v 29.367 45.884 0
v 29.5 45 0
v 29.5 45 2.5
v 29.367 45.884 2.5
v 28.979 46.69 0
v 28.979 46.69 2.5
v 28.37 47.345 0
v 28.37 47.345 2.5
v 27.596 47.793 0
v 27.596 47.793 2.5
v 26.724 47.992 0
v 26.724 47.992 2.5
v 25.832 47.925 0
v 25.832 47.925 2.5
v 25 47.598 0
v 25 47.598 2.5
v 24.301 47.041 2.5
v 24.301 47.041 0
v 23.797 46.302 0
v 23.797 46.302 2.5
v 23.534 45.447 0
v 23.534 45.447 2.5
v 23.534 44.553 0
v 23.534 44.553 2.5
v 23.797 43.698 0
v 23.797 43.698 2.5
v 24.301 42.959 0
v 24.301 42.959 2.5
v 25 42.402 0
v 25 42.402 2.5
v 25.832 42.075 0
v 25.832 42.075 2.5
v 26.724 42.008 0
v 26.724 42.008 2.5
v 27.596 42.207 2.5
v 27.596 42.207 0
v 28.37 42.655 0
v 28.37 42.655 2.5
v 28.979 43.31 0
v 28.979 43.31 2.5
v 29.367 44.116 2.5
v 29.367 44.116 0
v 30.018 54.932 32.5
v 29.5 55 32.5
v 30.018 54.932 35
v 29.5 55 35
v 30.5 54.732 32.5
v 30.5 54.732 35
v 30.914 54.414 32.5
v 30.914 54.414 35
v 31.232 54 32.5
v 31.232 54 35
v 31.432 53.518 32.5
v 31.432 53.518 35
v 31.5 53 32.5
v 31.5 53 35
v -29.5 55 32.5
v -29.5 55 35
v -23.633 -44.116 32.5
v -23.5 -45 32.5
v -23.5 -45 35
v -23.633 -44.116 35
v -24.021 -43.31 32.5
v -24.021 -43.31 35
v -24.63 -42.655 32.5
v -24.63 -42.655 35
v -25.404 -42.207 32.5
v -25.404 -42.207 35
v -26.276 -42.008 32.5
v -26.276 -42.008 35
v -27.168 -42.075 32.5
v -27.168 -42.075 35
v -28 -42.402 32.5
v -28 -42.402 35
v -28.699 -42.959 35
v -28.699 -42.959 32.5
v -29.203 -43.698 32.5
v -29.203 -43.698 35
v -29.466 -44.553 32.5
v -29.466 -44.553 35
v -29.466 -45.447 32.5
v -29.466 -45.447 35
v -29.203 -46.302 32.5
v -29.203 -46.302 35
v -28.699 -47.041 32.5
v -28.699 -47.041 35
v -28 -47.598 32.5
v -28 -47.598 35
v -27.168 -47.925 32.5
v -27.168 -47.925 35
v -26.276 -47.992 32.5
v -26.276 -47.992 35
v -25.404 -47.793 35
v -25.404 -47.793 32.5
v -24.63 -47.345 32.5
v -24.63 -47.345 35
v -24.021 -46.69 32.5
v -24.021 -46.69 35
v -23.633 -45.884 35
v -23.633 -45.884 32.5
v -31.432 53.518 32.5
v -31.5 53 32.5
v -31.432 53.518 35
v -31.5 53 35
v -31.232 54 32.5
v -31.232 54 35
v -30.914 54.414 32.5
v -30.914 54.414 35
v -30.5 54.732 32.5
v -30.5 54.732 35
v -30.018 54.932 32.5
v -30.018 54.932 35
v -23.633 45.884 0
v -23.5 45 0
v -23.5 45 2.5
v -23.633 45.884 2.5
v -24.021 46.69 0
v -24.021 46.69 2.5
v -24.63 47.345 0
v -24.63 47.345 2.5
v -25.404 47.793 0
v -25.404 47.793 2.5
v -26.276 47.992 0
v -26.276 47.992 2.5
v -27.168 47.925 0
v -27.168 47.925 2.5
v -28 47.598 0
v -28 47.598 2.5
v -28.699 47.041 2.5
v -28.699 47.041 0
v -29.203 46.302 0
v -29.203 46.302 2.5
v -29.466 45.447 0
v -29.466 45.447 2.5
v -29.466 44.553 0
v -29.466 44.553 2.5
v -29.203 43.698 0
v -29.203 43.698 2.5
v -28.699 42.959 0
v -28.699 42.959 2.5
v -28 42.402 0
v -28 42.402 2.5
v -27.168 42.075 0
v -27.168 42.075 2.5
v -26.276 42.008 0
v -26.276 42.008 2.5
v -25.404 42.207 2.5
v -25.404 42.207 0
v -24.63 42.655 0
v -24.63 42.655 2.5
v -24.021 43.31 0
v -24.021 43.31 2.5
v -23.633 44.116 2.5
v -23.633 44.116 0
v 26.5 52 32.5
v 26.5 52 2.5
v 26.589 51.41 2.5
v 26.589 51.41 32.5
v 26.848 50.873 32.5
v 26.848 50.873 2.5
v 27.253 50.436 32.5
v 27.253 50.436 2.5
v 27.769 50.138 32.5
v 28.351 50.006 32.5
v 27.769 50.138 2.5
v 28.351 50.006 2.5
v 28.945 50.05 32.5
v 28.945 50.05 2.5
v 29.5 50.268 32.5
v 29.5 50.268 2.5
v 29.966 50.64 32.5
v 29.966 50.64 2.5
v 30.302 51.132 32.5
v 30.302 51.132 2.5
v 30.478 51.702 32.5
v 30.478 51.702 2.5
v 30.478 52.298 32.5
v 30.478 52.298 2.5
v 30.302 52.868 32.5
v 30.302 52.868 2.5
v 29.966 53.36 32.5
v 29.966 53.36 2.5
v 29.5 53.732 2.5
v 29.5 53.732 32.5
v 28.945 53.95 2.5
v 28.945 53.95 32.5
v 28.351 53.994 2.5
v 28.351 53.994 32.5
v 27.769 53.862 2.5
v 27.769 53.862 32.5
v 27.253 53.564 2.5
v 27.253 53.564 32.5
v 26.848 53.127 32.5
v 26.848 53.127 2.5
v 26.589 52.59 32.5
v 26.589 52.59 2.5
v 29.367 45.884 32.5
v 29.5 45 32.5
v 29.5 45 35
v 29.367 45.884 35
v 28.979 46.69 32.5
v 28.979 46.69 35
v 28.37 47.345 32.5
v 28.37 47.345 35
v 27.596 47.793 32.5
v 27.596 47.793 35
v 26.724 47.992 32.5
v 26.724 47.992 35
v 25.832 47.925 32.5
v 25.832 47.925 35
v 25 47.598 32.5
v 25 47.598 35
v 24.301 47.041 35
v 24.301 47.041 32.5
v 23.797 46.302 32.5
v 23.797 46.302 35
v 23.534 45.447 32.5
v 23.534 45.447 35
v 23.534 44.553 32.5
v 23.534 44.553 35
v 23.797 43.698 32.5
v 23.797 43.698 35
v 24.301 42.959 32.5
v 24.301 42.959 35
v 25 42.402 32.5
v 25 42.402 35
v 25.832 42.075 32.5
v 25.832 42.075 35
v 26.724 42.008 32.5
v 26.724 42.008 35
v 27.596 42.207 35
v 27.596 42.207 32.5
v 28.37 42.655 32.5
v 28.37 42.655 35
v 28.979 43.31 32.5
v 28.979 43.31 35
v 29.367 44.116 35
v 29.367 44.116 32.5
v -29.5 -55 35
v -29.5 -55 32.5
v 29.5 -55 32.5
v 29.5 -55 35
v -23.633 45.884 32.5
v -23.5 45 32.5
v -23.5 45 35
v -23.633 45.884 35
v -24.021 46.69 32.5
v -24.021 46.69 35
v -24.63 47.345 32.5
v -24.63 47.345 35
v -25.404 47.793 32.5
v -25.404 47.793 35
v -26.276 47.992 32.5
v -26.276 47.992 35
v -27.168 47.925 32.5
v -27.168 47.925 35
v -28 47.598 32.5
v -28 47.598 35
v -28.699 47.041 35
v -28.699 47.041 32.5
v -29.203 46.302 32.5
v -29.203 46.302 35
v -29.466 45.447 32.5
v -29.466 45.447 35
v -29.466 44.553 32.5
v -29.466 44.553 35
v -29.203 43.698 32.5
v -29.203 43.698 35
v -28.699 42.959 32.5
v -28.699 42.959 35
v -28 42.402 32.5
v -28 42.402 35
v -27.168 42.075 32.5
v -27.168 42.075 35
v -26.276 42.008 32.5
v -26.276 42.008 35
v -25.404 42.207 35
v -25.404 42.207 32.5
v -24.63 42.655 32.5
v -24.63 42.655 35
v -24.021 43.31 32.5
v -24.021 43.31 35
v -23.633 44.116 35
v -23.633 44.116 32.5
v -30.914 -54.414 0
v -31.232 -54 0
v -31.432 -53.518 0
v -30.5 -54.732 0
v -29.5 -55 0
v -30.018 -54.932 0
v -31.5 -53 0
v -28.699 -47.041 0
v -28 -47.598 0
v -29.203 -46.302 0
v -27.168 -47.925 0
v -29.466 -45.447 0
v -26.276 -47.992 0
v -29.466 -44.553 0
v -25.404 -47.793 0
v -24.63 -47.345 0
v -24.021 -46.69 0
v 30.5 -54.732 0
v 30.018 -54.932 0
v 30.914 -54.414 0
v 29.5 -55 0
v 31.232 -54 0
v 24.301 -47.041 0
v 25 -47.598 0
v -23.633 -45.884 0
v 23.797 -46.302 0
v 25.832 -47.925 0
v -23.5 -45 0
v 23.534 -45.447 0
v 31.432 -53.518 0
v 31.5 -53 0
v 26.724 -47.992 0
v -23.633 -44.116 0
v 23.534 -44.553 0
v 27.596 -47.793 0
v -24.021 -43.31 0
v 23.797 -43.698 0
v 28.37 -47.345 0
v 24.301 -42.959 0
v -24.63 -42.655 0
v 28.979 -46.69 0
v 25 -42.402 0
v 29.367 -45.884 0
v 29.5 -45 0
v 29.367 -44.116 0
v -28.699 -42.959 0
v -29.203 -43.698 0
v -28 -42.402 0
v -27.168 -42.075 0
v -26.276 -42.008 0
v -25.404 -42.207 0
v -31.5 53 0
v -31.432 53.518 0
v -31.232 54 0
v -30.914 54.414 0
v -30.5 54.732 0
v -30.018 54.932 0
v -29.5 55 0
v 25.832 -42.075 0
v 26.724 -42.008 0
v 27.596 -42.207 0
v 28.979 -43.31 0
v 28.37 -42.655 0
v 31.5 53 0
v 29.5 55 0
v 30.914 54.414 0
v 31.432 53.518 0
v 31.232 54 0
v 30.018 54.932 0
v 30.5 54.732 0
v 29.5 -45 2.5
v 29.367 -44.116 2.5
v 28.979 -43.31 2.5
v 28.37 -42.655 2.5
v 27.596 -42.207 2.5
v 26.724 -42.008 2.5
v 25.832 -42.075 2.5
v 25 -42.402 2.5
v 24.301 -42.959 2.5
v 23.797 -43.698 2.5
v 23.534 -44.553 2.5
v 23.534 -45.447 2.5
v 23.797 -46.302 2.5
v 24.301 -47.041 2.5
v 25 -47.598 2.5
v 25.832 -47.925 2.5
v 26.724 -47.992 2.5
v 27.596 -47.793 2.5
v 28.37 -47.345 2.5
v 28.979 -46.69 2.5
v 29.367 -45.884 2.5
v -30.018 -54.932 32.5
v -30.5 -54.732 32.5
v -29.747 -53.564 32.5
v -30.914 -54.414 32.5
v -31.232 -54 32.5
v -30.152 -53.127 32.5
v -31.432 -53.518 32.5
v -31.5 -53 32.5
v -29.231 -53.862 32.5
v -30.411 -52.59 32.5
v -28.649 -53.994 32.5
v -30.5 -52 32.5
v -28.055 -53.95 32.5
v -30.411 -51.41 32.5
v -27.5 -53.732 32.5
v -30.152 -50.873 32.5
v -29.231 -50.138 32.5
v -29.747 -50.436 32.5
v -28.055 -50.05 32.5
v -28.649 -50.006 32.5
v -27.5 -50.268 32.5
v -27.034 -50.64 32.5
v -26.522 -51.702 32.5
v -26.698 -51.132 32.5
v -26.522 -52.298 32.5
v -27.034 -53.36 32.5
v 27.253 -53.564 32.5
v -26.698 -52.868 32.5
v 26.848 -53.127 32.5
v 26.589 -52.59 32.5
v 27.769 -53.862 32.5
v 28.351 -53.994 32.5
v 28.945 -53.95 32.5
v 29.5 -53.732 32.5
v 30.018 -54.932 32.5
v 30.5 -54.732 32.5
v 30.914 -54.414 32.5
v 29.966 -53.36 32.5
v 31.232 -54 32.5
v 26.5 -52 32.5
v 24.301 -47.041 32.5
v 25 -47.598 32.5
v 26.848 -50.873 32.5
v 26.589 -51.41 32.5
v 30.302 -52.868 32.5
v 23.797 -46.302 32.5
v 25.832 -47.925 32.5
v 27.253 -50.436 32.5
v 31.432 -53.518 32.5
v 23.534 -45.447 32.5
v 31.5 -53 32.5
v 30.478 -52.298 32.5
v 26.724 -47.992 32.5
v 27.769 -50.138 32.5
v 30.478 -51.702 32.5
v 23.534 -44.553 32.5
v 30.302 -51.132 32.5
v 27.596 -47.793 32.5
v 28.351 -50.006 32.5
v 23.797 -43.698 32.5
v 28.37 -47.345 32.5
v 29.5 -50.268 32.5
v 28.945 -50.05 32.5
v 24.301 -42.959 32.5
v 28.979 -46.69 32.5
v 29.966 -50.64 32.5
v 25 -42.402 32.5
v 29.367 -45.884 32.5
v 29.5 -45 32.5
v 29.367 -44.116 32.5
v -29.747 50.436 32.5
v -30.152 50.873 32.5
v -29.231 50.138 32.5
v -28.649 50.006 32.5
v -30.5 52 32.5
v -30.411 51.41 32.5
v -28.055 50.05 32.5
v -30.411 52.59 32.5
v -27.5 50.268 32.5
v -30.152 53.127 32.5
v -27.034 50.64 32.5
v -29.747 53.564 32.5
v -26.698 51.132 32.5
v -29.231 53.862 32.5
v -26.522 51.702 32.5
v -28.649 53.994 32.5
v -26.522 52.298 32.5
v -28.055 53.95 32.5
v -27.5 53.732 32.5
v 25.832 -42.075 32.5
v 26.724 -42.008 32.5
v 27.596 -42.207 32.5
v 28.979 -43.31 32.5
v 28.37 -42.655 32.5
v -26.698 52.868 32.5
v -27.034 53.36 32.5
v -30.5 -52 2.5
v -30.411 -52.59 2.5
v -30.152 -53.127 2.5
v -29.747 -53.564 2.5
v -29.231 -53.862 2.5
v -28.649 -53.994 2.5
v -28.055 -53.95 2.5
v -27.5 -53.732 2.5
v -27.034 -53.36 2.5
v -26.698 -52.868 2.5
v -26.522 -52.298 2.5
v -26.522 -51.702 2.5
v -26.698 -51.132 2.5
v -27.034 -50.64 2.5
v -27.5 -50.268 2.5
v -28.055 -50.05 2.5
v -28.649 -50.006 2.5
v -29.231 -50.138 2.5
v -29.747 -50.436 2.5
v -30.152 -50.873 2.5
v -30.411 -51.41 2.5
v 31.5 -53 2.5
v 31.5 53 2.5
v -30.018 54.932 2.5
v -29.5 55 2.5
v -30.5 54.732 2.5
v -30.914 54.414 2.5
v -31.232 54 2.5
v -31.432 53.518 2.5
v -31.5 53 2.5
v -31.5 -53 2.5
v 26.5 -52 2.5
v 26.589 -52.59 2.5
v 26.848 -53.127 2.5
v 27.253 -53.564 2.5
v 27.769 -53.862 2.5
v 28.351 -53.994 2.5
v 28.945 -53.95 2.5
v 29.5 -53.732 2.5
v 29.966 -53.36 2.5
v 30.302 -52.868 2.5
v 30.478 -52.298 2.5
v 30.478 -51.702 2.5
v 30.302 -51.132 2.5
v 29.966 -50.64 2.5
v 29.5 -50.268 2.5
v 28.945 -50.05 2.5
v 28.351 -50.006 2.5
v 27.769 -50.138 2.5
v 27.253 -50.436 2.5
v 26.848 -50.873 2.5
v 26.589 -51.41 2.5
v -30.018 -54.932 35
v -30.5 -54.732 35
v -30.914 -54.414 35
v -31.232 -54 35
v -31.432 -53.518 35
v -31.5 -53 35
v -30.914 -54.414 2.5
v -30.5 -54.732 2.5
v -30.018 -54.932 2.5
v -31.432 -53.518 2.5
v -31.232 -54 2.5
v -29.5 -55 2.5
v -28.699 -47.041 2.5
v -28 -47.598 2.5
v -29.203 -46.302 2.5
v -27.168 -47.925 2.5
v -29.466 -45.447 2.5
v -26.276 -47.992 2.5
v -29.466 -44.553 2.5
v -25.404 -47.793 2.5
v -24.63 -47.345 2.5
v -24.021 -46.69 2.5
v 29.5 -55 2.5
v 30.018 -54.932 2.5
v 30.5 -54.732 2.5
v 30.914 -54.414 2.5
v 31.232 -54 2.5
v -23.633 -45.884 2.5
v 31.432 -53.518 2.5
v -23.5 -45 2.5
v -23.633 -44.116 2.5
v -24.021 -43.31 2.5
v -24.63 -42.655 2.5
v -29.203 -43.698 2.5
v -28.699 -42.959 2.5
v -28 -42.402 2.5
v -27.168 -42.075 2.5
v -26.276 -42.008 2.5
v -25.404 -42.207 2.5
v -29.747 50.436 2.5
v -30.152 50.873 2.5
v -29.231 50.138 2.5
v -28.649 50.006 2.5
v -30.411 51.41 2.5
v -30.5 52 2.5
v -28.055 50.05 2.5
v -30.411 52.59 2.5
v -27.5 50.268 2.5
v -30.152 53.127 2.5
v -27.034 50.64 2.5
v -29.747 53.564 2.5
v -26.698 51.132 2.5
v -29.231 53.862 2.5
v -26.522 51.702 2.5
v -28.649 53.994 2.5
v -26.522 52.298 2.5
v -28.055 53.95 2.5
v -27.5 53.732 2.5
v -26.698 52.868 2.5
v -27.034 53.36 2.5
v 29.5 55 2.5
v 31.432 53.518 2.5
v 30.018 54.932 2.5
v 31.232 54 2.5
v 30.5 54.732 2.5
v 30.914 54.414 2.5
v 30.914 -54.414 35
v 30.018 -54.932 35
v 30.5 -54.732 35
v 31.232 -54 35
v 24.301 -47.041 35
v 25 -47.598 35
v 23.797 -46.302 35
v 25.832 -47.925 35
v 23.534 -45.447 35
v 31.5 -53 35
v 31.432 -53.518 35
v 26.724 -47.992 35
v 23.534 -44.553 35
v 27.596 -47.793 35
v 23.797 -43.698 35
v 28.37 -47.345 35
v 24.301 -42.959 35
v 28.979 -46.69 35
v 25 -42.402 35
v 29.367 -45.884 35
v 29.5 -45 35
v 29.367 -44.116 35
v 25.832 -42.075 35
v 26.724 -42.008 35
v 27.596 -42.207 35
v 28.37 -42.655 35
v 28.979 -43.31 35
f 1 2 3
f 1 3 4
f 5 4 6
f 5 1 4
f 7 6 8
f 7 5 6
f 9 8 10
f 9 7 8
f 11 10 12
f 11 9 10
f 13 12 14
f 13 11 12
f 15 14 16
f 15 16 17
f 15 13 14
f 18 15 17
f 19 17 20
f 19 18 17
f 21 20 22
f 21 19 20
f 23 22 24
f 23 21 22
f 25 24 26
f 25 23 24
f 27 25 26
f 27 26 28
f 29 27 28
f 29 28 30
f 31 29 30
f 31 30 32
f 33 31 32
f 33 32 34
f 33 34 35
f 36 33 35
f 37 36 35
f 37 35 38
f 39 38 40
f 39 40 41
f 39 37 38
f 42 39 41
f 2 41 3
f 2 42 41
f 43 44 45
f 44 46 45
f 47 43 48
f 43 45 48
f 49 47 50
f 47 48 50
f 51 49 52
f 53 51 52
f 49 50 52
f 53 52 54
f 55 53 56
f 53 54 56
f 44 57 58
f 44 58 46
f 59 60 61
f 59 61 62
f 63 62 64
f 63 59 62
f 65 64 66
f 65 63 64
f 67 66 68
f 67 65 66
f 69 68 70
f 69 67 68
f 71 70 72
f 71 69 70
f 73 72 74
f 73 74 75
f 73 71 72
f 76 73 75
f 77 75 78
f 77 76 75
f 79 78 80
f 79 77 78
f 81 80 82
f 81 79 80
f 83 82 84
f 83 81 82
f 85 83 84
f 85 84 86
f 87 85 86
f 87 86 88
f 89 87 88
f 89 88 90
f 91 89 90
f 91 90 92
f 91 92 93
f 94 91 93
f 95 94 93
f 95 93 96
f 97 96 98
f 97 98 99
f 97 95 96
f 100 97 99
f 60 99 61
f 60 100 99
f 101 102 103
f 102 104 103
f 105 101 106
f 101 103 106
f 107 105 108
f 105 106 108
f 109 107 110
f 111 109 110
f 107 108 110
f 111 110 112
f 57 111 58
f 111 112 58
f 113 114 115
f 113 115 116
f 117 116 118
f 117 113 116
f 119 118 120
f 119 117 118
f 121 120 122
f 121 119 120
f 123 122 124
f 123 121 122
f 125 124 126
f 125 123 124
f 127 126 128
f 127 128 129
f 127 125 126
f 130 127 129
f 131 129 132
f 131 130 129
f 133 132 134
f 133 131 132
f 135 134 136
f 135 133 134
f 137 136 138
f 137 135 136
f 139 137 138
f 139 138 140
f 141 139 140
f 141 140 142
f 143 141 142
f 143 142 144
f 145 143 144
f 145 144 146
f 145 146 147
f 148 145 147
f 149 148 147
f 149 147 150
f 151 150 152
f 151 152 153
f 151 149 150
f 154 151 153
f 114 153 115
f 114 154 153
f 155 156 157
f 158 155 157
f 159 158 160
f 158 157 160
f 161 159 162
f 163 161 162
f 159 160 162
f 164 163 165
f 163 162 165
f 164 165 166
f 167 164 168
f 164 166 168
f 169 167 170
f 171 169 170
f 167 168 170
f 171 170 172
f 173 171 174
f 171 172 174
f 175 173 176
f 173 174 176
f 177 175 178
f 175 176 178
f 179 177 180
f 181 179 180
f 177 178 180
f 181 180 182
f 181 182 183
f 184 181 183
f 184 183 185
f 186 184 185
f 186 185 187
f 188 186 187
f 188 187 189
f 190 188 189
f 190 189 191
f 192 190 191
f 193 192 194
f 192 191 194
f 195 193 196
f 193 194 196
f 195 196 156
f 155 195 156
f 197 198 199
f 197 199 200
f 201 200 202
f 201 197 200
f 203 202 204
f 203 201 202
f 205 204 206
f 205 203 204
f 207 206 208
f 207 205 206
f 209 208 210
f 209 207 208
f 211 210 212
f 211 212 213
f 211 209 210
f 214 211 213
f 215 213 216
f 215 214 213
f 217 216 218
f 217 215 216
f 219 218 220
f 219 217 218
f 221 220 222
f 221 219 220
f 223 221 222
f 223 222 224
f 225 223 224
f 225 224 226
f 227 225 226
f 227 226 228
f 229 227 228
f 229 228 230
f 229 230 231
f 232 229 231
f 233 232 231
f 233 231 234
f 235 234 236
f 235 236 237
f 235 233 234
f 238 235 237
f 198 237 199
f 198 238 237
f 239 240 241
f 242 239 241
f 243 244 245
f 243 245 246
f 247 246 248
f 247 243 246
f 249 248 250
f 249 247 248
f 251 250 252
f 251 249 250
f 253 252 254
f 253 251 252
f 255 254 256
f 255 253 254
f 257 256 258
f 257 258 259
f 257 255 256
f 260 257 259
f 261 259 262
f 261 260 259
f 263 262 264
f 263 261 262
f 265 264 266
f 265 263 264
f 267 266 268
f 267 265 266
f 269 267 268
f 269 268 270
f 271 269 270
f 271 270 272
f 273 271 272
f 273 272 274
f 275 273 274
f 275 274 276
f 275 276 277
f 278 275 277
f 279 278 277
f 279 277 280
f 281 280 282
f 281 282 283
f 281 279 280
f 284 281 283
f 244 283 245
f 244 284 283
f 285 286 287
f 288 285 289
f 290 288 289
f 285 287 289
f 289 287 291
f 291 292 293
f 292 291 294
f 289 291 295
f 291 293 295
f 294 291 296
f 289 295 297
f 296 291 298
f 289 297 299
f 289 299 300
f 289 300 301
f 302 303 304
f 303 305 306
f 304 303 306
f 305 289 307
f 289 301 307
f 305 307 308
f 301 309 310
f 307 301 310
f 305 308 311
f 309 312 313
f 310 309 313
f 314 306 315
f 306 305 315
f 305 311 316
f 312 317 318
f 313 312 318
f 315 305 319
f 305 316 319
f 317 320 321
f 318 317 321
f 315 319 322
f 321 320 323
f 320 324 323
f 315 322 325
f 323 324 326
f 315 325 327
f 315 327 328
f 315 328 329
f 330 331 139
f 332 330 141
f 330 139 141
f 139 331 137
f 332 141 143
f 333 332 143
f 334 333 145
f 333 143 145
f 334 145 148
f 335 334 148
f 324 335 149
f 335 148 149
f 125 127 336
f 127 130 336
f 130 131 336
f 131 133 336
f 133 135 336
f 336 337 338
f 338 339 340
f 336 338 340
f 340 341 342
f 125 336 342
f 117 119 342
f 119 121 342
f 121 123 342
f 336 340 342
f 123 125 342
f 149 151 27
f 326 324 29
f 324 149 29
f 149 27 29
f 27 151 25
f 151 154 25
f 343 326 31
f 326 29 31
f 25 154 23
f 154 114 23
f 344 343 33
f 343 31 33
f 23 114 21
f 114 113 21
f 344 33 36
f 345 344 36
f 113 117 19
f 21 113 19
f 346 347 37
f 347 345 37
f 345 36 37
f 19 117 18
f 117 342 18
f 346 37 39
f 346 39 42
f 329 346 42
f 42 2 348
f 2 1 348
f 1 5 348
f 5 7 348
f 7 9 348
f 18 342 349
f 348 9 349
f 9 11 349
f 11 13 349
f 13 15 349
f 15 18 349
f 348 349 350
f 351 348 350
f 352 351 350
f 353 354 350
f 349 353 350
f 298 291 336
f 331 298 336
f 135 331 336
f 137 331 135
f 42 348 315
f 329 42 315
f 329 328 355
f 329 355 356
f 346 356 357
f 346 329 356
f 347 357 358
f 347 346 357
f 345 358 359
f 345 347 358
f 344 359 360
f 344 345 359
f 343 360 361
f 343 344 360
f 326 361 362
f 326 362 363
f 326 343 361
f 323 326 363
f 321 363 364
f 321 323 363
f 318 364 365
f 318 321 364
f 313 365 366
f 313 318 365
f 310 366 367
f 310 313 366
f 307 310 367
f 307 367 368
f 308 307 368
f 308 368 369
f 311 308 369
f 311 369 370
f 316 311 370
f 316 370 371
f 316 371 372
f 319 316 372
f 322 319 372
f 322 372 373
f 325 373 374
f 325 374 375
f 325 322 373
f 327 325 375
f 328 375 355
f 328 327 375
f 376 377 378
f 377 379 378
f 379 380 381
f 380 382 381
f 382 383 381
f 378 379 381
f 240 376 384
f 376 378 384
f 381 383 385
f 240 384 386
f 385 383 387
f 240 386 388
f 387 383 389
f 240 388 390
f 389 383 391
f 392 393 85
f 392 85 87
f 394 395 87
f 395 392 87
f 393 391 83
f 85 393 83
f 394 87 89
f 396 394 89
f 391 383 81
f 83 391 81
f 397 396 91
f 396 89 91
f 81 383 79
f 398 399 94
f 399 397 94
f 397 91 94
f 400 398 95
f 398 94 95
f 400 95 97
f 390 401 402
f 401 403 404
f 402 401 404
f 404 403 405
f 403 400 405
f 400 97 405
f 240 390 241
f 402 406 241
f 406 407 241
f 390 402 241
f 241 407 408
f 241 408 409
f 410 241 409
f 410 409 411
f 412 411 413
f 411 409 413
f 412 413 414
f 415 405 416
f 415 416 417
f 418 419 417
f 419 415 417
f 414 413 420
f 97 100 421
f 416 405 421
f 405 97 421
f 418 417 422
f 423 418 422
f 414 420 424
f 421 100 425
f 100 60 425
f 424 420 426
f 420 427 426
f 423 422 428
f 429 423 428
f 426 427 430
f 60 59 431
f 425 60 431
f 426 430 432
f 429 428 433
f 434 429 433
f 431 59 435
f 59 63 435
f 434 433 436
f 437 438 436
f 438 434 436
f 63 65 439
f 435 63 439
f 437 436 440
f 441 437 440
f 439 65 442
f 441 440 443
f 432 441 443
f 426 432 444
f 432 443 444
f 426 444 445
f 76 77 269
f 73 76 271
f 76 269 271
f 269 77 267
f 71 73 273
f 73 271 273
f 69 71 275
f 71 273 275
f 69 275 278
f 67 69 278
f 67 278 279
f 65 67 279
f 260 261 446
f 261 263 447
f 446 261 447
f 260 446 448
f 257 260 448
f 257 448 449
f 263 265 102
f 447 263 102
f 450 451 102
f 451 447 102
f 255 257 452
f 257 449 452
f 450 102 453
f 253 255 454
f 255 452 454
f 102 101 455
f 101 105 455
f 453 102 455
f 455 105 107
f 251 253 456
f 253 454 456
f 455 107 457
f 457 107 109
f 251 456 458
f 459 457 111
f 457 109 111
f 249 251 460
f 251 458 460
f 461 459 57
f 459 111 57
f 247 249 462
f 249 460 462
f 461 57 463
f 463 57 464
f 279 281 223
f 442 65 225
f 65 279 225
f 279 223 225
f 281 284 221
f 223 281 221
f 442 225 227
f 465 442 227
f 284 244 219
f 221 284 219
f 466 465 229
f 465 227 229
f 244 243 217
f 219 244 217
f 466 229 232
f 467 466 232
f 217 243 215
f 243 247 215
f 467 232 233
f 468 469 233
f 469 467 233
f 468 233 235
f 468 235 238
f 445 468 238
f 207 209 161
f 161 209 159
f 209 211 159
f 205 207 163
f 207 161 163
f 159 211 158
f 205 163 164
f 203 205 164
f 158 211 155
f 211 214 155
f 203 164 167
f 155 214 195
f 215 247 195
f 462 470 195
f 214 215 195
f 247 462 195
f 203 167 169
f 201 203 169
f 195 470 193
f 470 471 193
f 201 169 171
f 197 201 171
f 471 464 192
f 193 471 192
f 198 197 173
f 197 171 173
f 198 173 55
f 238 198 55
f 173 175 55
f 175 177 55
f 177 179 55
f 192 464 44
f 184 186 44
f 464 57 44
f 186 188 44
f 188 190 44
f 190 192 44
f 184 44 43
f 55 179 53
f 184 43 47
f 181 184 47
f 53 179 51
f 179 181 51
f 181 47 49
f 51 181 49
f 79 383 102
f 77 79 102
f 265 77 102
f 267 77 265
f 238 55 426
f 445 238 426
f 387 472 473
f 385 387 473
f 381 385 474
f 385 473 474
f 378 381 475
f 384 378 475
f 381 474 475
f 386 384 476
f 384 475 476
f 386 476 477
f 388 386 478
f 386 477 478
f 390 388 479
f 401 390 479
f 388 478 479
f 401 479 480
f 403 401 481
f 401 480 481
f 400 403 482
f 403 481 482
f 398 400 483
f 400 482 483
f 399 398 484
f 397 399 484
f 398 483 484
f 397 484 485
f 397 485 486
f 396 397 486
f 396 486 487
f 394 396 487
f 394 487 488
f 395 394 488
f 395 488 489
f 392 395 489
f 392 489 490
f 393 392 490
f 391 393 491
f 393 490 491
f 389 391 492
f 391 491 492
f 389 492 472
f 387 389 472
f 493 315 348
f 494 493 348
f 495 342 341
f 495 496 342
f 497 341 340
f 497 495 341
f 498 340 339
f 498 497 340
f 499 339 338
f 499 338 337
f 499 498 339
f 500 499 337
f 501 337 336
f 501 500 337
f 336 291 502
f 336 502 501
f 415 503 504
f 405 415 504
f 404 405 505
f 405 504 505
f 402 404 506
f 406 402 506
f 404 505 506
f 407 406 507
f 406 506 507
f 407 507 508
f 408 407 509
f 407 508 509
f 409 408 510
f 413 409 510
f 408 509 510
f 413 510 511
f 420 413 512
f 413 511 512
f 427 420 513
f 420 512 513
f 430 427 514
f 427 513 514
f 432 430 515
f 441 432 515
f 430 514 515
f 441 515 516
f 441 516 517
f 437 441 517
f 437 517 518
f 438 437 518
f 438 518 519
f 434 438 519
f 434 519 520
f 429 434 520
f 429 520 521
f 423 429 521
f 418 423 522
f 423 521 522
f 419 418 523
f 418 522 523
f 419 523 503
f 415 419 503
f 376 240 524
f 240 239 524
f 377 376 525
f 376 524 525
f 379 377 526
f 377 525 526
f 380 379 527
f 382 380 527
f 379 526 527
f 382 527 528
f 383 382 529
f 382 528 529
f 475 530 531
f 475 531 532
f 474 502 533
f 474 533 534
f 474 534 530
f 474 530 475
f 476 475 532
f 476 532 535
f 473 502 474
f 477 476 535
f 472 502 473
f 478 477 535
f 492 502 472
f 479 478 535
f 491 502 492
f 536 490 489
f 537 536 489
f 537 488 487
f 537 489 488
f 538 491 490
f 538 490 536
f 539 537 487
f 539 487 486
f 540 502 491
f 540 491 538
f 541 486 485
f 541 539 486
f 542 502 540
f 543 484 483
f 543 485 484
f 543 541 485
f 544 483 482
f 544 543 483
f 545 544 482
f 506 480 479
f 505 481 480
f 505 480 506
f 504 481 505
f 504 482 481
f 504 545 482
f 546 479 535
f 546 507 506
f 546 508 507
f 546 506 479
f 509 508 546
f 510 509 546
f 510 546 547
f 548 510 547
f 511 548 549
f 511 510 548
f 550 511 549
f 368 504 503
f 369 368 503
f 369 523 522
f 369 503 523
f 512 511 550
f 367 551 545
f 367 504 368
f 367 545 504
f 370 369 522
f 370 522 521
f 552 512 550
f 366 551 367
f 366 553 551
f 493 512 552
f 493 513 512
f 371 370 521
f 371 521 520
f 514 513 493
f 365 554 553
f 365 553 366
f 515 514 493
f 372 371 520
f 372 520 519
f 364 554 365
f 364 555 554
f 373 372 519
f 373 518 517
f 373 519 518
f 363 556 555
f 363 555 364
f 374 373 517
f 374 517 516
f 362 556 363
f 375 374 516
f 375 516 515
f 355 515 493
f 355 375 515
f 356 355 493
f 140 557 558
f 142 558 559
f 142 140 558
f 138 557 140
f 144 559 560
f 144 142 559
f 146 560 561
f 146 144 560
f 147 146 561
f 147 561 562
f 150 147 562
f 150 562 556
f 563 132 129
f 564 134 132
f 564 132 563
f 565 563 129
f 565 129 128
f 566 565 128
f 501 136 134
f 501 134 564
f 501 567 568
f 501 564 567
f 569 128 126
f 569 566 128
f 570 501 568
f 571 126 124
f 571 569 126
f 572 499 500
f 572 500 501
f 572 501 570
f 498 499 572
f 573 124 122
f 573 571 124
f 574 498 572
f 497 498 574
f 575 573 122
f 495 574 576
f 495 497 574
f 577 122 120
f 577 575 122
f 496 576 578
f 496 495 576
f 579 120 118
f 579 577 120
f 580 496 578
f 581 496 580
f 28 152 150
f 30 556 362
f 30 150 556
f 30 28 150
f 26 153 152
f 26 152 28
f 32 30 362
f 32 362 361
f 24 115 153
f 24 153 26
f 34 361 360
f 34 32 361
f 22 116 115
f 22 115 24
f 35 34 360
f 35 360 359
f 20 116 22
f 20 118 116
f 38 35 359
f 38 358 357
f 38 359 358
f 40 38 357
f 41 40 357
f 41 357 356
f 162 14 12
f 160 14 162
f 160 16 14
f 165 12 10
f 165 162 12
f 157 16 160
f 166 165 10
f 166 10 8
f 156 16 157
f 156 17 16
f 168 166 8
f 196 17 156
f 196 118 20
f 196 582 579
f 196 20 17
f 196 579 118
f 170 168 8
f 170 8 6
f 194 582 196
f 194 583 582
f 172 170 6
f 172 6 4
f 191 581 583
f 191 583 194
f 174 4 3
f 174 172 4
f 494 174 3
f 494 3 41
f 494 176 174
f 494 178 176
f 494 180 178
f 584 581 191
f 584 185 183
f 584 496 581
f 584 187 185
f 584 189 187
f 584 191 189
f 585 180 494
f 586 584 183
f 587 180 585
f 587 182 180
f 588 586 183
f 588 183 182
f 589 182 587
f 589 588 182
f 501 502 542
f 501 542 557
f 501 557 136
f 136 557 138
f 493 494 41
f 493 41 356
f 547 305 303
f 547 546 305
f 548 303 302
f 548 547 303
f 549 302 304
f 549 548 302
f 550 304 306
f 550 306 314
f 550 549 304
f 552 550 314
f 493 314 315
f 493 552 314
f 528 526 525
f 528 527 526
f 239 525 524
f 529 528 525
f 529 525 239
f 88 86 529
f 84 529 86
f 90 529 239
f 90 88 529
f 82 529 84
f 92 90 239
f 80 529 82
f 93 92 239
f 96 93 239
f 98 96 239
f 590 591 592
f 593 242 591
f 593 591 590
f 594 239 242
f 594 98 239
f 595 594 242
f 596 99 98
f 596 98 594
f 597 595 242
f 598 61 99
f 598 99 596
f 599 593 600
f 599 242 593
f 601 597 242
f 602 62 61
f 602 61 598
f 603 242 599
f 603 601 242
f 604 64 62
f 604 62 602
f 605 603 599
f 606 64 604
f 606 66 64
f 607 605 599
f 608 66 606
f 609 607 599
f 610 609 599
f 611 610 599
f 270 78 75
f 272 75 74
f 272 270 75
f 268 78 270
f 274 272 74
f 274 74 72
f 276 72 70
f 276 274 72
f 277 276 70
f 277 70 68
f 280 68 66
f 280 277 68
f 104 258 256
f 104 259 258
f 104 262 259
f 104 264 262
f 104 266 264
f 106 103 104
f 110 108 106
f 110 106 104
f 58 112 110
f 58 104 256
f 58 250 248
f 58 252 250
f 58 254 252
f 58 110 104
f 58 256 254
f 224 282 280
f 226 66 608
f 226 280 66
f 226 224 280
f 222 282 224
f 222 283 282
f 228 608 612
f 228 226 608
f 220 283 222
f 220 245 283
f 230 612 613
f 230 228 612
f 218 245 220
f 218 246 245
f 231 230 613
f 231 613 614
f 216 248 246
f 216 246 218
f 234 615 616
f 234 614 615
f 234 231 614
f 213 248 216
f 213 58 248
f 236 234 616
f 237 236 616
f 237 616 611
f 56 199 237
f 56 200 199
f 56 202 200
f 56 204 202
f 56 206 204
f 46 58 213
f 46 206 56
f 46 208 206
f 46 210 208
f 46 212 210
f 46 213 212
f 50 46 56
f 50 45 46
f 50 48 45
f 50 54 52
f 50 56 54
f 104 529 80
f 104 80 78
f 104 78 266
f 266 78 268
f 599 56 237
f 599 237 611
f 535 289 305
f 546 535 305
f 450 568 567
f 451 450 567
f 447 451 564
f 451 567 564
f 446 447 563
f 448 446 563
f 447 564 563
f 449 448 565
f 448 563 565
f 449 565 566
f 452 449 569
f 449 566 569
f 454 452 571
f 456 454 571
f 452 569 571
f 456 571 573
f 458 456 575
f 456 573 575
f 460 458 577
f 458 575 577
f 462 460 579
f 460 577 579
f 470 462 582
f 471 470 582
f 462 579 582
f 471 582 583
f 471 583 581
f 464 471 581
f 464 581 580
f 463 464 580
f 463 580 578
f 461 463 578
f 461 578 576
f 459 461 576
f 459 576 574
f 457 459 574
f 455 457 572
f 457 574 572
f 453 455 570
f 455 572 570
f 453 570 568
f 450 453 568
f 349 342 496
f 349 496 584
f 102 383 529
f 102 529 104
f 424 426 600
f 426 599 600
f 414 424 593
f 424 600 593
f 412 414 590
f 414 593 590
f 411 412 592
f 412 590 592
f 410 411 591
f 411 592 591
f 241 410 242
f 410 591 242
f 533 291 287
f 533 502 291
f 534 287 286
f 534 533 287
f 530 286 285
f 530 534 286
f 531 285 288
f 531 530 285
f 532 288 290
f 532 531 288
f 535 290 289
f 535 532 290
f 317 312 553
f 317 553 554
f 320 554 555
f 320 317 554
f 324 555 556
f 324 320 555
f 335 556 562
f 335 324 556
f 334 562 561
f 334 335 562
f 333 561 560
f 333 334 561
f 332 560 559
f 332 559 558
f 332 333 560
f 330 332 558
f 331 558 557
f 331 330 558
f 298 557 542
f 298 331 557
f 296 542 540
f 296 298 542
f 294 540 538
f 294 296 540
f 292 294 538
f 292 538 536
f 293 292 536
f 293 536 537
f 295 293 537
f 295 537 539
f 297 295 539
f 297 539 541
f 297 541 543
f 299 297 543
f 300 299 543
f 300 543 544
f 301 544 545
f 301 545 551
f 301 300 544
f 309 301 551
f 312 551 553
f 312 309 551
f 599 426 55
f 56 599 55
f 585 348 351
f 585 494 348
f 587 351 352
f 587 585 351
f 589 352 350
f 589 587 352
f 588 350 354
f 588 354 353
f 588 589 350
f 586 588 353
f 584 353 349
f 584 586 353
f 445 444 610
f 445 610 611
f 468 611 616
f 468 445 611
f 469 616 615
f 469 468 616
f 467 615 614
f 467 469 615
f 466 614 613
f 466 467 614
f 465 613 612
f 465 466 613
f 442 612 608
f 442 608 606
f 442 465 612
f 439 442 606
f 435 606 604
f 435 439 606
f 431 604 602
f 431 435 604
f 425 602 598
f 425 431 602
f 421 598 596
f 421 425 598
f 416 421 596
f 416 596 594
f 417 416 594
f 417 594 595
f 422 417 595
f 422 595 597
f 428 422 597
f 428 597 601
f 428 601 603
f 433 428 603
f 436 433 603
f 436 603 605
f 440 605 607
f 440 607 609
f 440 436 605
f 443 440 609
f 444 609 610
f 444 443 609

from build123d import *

# Parameters (mm, degrees)
SKETCH1_W           = 63
SKETCH1_H           = 110
SKETCH1_R           = 3
BOSS_EXTRUDE1_DEPTH = 2.5
SKETCH3_R           = 2
BOSS_EXTRUDE3_DEPTH = 30
FILLET2_R           = 2
FILLET3_R           = 2
FILLET4_R           = 2
FILLET5_R           = 2
SKETCH5_W           = 63
SKETCH5_H           = 110
SKETCH5_R           = 3
BOSS_EXTRUDE5_DEPTH = 2.5
FILLET10_R          = 2
FILLET11_R          = 2
FILLET12_R          = 2
FILLET13_R          = 2


with BuildPart() as part:
    # Sketch1 → Boss-Extrude1 (new body)
    with BuildSketch(Plane.XY):
        Rectangle(SKETCH1_W, SKETCH1_H)
        with Locations((-26.5, 45)):
            Circle(SKETCH1_R, mode=Mode.SUBTRACT)
        with Locations((-26.5, -45)):
            Circle(SKETCH1_R, mode=Mode.SUBTRACT)
        with Locations((26.5, -45)):
            Circle(SKETCH1_R, mode=Mode.SUBTRACT)
        with Locations((26.5, 45)):
            Circle(SKETCH1_R, mode=Mode.SUBTRACT)
    extrude(amount=BOSS_EXTRUDE1_DEPTH)

    # Sketch3 → Boss-Extrude3 (add)
    with BuildSketch(Plane.XY.offset(2.5)):
        with Locations(Location((-28.5, 52, 0), (0, 0, 180))):
            Circle(SKETCH3_R)
        with Locations(Location((28.5, 52, 0), (0, 0, 180))):
            Circle(SKETCH3_R)
        with Locations(Location((28.5, -52, 0), (0, 0, 180))):
            Circle(SKETCH3_R)
        with Locations(Location((-28.5, -52, 0), (0, 0, 180))):
            Circle(SKETCH3_R)
    extrude(amount=BOSS_EXTRUDE3_DEPTH)

    # Fillet2
    fillet2_edges = [part.edges().sort_by_distance(p)[0] for p in [
        (31.5, -55, 1.25),
    ]]
    fillet(fillet2_edges, radius=FILLET2_R)

    # Fillet3
    fillet3_edges = [part.edges().sort_by_distance(p)[0] for p in [
        (31.5, 55, 1.25),
    ]]
    fillet(fillet3_edges, radius=FILLET3_R)

    # Fillet4
    fillet4_edges = [part.edges().sort_by_distance(p)[0] for p in [
        (-31.5, 55, 1.25),
    ]]
    fillet(fillet4_edges, radius=FILLET4_R)

    # Fillet5
    fillet5_edges = [part.edges().sort_by_distance(p)[0] for p in [
        (-31.5, -55, 1.25),
    ]]
    fillet(fillet5_edges, radius=FILLET5_R)

    # Sketch5 → Boss-Extrude5 (add)
    with BuildSketch(Plane.XY.offset(32.5)):
        Rectangle(SKETCH5_W, SKETCH5_H)
        with Locations((-26.5, 45)):
            Circle(SKETCH5_R, mode=Mode.SUBTRACT)
        with Locations((-26.5, -45)):
            Circle(SKETCH5_R, mode=Mode.SUBTRACT)
        with Locations((26.5, -45)):
            Circle(SKETCH5_R, mode=Mode.SUBTRACT)
        with Locations((26.5, 45)):
            Circle(SKETCH5_R, mode=Mode.SUBTRACT)
    extrude(amount=BOSS_EXTRUDE5_DEPTH)

    # Fillet10
    fillet10_edges = [part.edges().sort_by_distance(p)[0] for p in [
        (31.5, 55, 33.75),
    ]]
    fillet(fillet10_edges, radius=FILLET10_R)

    # Fillet11
    fillet11_edges = [part.edges().sort_by_distance(p)[0] for p in [
        (31.5, -55, 33.75),
    ]]
    fillet(fillet11_edges, radius=FILLET11_R)

    # Fillet12
    fillet12_edges = [part.edges().sort_by_distance(p)[0] for p in [
        (-31.5, -55, 33.75),
    ]]
    fillet(fillet12_edges, radius=FILLET12_R)

    # Fillet13
    fillet13_edges = [part.edges().sort_by_distance(p)[0] for p in [
        (-31.5, 55, 33.75),
    ]]
    fillet(fillet13_edges, radius=FILLET13_R)


solid = part.part
